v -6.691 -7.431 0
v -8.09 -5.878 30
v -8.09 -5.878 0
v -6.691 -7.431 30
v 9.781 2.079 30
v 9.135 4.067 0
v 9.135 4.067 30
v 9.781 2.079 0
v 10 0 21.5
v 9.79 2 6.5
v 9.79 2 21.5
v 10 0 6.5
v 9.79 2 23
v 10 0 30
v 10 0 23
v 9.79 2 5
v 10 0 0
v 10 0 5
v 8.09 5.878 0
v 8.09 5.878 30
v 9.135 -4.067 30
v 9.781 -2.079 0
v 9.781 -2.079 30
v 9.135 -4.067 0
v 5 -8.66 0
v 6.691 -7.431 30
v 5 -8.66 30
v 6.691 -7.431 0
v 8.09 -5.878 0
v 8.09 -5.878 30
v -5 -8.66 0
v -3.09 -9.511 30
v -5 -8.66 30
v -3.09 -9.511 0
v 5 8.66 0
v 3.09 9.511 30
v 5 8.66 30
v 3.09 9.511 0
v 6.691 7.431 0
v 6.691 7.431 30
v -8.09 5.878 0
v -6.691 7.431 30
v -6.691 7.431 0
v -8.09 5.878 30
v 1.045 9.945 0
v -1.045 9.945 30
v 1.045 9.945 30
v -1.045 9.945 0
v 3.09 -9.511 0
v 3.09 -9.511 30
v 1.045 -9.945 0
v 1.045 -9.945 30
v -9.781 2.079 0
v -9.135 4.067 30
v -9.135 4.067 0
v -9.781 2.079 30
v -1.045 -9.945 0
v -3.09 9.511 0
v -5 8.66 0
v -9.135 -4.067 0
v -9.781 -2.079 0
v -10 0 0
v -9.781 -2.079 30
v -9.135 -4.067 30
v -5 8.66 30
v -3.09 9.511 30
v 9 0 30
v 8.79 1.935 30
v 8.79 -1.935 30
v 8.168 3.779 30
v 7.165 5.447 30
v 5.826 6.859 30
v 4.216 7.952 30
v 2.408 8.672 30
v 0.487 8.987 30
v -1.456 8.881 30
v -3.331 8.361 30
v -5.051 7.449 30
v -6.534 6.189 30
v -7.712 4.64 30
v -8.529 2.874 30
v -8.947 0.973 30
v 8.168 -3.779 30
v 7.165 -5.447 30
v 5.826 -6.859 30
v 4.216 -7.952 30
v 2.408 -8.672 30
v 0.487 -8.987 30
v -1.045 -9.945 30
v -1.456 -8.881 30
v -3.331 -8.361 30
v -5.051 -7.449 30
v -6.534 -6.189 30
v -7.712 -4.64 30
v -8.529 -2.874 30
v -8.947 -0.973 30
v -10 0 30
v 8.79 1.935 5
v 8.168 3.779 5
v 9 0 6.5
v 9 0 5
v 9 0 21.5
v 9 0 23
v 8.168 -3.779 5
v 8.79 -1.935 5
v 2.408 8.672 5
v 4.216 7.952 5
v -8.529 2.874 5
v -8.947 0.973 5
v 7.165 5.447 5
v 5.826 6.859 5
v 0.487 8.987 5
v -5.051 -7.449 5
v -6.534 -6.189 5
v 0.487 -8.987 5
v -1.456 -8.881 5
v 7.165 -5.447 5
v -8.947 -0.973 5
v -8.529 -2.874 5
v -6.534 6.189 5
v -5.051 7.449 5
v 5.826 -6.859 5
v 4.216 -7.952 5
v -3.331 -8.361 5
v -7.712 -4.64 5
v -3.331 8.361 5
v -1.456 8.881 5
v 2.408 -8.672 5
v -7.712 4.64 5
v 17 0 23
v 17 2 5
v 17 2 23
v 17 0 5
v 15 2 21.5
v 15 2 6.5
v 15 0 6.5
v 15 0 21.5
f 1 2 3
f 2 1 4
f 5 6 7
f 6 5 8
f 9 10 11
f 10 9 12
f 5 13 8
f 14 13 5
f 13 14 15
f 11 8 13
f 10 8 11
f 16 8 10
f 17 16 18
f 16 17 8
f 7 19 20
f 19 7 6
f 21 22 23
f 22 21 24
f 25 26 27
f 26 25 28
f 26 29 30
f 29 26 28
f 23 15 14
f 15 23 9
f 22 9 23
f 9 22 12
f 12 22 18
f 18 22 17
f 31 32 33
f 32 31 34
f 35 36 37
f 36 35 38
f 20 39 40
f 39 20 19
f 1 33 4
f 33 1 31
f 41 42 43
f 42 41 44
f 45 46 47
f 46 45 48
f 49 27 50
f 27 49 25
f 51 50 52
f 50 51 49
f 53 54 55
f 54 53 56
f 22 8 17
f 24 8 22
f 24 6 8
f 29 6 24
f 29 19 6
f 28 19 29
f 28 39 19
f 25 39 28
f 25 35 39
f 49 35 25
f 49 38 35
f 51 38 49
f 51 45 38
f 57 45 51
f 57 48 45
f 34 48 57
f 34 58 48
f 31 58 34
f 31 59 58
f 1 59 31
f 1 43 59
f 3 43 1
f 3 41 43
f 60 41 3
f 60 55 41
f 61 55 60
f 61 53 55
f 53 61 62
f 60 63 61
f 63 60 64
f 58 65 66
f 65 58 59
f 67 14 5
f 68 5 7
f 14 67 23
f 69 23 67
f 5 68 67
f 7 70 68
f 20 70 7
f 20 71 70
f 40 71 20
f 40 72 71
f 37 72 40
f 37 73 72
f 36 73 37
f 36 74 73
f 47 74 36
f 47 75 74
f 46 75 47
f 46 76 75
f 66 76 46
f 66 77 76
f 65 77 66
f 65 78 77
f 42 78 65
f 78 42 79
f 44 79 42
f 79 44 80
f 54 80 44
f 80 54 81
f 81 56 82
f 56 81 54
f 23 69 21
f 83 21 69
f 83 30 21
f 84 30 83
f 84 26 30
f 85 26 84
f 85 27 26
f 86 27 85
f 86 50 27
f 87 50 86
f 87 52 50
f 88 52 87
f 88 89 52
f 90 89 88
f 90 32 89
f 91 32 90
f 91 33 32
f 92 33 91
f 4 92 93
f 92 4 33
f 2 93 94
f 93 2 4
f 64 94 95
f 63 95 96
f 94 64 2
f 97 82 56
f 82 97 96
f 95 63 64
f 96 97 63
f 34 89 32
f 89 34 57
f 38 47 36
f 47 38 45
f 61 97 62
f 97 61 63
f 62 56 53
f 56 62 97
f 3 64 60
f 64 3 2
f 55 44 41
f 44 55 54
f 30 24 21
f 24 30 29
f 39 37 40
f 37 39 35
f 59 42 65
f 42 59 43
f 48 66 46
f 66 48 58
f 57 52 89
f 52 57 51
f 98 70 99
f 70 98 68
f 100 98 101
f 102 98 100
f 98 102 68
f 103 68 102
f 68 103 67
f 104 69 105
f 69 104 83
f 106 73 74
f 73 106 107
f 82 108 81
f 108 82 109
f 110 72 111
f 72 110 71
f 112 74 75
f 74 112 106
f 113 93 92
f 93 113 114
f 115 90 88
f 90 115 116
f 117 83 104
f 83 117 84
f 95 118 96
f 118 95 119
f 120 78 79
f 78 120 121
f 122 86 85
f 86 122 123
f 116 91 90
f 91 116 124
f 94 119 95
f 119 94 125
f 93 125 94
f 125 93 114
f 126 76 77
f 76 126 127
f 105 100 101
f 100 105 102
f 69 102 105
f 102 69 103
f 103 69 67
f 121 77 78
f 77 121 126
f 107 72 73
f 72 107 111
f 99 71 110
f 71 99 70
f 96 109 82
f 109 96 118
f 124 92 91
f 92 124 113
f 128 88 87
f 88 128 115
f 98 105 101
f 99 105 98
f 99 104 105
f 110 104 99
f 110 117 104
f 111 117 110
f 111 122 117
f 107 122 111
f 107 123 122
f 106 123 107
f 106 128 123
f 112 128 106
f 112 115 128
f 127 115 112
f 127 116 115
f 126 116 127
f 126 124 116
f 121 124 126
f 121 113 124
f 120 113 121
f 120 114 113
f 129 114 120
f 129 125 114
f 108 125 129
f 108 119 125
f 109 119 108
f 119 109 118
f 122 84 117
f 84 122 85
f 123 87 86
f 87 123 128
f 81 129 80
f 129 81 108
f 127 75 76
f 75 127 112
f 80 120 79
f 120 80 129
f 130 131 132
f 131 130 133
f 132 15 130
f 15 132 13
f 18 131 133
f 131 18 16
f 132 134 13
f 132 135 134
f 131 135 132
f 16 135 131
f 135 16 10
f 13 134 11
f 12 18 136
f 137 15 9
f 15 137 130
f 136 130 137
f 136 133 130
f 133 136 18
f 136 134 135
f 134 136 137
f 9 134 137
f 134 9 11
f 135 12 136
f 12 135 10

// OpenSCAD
union() {
	difference() {
		cylinder( r=10, h=30 );
		translate([0,0,5]) cylinder( r=9, h=30 );
	}
	difference() {
		translate([9,0,5]) cube( [8,2,18] );
		translate([9,-1,6.5]) cube( [6,4,15] );
	}
}
